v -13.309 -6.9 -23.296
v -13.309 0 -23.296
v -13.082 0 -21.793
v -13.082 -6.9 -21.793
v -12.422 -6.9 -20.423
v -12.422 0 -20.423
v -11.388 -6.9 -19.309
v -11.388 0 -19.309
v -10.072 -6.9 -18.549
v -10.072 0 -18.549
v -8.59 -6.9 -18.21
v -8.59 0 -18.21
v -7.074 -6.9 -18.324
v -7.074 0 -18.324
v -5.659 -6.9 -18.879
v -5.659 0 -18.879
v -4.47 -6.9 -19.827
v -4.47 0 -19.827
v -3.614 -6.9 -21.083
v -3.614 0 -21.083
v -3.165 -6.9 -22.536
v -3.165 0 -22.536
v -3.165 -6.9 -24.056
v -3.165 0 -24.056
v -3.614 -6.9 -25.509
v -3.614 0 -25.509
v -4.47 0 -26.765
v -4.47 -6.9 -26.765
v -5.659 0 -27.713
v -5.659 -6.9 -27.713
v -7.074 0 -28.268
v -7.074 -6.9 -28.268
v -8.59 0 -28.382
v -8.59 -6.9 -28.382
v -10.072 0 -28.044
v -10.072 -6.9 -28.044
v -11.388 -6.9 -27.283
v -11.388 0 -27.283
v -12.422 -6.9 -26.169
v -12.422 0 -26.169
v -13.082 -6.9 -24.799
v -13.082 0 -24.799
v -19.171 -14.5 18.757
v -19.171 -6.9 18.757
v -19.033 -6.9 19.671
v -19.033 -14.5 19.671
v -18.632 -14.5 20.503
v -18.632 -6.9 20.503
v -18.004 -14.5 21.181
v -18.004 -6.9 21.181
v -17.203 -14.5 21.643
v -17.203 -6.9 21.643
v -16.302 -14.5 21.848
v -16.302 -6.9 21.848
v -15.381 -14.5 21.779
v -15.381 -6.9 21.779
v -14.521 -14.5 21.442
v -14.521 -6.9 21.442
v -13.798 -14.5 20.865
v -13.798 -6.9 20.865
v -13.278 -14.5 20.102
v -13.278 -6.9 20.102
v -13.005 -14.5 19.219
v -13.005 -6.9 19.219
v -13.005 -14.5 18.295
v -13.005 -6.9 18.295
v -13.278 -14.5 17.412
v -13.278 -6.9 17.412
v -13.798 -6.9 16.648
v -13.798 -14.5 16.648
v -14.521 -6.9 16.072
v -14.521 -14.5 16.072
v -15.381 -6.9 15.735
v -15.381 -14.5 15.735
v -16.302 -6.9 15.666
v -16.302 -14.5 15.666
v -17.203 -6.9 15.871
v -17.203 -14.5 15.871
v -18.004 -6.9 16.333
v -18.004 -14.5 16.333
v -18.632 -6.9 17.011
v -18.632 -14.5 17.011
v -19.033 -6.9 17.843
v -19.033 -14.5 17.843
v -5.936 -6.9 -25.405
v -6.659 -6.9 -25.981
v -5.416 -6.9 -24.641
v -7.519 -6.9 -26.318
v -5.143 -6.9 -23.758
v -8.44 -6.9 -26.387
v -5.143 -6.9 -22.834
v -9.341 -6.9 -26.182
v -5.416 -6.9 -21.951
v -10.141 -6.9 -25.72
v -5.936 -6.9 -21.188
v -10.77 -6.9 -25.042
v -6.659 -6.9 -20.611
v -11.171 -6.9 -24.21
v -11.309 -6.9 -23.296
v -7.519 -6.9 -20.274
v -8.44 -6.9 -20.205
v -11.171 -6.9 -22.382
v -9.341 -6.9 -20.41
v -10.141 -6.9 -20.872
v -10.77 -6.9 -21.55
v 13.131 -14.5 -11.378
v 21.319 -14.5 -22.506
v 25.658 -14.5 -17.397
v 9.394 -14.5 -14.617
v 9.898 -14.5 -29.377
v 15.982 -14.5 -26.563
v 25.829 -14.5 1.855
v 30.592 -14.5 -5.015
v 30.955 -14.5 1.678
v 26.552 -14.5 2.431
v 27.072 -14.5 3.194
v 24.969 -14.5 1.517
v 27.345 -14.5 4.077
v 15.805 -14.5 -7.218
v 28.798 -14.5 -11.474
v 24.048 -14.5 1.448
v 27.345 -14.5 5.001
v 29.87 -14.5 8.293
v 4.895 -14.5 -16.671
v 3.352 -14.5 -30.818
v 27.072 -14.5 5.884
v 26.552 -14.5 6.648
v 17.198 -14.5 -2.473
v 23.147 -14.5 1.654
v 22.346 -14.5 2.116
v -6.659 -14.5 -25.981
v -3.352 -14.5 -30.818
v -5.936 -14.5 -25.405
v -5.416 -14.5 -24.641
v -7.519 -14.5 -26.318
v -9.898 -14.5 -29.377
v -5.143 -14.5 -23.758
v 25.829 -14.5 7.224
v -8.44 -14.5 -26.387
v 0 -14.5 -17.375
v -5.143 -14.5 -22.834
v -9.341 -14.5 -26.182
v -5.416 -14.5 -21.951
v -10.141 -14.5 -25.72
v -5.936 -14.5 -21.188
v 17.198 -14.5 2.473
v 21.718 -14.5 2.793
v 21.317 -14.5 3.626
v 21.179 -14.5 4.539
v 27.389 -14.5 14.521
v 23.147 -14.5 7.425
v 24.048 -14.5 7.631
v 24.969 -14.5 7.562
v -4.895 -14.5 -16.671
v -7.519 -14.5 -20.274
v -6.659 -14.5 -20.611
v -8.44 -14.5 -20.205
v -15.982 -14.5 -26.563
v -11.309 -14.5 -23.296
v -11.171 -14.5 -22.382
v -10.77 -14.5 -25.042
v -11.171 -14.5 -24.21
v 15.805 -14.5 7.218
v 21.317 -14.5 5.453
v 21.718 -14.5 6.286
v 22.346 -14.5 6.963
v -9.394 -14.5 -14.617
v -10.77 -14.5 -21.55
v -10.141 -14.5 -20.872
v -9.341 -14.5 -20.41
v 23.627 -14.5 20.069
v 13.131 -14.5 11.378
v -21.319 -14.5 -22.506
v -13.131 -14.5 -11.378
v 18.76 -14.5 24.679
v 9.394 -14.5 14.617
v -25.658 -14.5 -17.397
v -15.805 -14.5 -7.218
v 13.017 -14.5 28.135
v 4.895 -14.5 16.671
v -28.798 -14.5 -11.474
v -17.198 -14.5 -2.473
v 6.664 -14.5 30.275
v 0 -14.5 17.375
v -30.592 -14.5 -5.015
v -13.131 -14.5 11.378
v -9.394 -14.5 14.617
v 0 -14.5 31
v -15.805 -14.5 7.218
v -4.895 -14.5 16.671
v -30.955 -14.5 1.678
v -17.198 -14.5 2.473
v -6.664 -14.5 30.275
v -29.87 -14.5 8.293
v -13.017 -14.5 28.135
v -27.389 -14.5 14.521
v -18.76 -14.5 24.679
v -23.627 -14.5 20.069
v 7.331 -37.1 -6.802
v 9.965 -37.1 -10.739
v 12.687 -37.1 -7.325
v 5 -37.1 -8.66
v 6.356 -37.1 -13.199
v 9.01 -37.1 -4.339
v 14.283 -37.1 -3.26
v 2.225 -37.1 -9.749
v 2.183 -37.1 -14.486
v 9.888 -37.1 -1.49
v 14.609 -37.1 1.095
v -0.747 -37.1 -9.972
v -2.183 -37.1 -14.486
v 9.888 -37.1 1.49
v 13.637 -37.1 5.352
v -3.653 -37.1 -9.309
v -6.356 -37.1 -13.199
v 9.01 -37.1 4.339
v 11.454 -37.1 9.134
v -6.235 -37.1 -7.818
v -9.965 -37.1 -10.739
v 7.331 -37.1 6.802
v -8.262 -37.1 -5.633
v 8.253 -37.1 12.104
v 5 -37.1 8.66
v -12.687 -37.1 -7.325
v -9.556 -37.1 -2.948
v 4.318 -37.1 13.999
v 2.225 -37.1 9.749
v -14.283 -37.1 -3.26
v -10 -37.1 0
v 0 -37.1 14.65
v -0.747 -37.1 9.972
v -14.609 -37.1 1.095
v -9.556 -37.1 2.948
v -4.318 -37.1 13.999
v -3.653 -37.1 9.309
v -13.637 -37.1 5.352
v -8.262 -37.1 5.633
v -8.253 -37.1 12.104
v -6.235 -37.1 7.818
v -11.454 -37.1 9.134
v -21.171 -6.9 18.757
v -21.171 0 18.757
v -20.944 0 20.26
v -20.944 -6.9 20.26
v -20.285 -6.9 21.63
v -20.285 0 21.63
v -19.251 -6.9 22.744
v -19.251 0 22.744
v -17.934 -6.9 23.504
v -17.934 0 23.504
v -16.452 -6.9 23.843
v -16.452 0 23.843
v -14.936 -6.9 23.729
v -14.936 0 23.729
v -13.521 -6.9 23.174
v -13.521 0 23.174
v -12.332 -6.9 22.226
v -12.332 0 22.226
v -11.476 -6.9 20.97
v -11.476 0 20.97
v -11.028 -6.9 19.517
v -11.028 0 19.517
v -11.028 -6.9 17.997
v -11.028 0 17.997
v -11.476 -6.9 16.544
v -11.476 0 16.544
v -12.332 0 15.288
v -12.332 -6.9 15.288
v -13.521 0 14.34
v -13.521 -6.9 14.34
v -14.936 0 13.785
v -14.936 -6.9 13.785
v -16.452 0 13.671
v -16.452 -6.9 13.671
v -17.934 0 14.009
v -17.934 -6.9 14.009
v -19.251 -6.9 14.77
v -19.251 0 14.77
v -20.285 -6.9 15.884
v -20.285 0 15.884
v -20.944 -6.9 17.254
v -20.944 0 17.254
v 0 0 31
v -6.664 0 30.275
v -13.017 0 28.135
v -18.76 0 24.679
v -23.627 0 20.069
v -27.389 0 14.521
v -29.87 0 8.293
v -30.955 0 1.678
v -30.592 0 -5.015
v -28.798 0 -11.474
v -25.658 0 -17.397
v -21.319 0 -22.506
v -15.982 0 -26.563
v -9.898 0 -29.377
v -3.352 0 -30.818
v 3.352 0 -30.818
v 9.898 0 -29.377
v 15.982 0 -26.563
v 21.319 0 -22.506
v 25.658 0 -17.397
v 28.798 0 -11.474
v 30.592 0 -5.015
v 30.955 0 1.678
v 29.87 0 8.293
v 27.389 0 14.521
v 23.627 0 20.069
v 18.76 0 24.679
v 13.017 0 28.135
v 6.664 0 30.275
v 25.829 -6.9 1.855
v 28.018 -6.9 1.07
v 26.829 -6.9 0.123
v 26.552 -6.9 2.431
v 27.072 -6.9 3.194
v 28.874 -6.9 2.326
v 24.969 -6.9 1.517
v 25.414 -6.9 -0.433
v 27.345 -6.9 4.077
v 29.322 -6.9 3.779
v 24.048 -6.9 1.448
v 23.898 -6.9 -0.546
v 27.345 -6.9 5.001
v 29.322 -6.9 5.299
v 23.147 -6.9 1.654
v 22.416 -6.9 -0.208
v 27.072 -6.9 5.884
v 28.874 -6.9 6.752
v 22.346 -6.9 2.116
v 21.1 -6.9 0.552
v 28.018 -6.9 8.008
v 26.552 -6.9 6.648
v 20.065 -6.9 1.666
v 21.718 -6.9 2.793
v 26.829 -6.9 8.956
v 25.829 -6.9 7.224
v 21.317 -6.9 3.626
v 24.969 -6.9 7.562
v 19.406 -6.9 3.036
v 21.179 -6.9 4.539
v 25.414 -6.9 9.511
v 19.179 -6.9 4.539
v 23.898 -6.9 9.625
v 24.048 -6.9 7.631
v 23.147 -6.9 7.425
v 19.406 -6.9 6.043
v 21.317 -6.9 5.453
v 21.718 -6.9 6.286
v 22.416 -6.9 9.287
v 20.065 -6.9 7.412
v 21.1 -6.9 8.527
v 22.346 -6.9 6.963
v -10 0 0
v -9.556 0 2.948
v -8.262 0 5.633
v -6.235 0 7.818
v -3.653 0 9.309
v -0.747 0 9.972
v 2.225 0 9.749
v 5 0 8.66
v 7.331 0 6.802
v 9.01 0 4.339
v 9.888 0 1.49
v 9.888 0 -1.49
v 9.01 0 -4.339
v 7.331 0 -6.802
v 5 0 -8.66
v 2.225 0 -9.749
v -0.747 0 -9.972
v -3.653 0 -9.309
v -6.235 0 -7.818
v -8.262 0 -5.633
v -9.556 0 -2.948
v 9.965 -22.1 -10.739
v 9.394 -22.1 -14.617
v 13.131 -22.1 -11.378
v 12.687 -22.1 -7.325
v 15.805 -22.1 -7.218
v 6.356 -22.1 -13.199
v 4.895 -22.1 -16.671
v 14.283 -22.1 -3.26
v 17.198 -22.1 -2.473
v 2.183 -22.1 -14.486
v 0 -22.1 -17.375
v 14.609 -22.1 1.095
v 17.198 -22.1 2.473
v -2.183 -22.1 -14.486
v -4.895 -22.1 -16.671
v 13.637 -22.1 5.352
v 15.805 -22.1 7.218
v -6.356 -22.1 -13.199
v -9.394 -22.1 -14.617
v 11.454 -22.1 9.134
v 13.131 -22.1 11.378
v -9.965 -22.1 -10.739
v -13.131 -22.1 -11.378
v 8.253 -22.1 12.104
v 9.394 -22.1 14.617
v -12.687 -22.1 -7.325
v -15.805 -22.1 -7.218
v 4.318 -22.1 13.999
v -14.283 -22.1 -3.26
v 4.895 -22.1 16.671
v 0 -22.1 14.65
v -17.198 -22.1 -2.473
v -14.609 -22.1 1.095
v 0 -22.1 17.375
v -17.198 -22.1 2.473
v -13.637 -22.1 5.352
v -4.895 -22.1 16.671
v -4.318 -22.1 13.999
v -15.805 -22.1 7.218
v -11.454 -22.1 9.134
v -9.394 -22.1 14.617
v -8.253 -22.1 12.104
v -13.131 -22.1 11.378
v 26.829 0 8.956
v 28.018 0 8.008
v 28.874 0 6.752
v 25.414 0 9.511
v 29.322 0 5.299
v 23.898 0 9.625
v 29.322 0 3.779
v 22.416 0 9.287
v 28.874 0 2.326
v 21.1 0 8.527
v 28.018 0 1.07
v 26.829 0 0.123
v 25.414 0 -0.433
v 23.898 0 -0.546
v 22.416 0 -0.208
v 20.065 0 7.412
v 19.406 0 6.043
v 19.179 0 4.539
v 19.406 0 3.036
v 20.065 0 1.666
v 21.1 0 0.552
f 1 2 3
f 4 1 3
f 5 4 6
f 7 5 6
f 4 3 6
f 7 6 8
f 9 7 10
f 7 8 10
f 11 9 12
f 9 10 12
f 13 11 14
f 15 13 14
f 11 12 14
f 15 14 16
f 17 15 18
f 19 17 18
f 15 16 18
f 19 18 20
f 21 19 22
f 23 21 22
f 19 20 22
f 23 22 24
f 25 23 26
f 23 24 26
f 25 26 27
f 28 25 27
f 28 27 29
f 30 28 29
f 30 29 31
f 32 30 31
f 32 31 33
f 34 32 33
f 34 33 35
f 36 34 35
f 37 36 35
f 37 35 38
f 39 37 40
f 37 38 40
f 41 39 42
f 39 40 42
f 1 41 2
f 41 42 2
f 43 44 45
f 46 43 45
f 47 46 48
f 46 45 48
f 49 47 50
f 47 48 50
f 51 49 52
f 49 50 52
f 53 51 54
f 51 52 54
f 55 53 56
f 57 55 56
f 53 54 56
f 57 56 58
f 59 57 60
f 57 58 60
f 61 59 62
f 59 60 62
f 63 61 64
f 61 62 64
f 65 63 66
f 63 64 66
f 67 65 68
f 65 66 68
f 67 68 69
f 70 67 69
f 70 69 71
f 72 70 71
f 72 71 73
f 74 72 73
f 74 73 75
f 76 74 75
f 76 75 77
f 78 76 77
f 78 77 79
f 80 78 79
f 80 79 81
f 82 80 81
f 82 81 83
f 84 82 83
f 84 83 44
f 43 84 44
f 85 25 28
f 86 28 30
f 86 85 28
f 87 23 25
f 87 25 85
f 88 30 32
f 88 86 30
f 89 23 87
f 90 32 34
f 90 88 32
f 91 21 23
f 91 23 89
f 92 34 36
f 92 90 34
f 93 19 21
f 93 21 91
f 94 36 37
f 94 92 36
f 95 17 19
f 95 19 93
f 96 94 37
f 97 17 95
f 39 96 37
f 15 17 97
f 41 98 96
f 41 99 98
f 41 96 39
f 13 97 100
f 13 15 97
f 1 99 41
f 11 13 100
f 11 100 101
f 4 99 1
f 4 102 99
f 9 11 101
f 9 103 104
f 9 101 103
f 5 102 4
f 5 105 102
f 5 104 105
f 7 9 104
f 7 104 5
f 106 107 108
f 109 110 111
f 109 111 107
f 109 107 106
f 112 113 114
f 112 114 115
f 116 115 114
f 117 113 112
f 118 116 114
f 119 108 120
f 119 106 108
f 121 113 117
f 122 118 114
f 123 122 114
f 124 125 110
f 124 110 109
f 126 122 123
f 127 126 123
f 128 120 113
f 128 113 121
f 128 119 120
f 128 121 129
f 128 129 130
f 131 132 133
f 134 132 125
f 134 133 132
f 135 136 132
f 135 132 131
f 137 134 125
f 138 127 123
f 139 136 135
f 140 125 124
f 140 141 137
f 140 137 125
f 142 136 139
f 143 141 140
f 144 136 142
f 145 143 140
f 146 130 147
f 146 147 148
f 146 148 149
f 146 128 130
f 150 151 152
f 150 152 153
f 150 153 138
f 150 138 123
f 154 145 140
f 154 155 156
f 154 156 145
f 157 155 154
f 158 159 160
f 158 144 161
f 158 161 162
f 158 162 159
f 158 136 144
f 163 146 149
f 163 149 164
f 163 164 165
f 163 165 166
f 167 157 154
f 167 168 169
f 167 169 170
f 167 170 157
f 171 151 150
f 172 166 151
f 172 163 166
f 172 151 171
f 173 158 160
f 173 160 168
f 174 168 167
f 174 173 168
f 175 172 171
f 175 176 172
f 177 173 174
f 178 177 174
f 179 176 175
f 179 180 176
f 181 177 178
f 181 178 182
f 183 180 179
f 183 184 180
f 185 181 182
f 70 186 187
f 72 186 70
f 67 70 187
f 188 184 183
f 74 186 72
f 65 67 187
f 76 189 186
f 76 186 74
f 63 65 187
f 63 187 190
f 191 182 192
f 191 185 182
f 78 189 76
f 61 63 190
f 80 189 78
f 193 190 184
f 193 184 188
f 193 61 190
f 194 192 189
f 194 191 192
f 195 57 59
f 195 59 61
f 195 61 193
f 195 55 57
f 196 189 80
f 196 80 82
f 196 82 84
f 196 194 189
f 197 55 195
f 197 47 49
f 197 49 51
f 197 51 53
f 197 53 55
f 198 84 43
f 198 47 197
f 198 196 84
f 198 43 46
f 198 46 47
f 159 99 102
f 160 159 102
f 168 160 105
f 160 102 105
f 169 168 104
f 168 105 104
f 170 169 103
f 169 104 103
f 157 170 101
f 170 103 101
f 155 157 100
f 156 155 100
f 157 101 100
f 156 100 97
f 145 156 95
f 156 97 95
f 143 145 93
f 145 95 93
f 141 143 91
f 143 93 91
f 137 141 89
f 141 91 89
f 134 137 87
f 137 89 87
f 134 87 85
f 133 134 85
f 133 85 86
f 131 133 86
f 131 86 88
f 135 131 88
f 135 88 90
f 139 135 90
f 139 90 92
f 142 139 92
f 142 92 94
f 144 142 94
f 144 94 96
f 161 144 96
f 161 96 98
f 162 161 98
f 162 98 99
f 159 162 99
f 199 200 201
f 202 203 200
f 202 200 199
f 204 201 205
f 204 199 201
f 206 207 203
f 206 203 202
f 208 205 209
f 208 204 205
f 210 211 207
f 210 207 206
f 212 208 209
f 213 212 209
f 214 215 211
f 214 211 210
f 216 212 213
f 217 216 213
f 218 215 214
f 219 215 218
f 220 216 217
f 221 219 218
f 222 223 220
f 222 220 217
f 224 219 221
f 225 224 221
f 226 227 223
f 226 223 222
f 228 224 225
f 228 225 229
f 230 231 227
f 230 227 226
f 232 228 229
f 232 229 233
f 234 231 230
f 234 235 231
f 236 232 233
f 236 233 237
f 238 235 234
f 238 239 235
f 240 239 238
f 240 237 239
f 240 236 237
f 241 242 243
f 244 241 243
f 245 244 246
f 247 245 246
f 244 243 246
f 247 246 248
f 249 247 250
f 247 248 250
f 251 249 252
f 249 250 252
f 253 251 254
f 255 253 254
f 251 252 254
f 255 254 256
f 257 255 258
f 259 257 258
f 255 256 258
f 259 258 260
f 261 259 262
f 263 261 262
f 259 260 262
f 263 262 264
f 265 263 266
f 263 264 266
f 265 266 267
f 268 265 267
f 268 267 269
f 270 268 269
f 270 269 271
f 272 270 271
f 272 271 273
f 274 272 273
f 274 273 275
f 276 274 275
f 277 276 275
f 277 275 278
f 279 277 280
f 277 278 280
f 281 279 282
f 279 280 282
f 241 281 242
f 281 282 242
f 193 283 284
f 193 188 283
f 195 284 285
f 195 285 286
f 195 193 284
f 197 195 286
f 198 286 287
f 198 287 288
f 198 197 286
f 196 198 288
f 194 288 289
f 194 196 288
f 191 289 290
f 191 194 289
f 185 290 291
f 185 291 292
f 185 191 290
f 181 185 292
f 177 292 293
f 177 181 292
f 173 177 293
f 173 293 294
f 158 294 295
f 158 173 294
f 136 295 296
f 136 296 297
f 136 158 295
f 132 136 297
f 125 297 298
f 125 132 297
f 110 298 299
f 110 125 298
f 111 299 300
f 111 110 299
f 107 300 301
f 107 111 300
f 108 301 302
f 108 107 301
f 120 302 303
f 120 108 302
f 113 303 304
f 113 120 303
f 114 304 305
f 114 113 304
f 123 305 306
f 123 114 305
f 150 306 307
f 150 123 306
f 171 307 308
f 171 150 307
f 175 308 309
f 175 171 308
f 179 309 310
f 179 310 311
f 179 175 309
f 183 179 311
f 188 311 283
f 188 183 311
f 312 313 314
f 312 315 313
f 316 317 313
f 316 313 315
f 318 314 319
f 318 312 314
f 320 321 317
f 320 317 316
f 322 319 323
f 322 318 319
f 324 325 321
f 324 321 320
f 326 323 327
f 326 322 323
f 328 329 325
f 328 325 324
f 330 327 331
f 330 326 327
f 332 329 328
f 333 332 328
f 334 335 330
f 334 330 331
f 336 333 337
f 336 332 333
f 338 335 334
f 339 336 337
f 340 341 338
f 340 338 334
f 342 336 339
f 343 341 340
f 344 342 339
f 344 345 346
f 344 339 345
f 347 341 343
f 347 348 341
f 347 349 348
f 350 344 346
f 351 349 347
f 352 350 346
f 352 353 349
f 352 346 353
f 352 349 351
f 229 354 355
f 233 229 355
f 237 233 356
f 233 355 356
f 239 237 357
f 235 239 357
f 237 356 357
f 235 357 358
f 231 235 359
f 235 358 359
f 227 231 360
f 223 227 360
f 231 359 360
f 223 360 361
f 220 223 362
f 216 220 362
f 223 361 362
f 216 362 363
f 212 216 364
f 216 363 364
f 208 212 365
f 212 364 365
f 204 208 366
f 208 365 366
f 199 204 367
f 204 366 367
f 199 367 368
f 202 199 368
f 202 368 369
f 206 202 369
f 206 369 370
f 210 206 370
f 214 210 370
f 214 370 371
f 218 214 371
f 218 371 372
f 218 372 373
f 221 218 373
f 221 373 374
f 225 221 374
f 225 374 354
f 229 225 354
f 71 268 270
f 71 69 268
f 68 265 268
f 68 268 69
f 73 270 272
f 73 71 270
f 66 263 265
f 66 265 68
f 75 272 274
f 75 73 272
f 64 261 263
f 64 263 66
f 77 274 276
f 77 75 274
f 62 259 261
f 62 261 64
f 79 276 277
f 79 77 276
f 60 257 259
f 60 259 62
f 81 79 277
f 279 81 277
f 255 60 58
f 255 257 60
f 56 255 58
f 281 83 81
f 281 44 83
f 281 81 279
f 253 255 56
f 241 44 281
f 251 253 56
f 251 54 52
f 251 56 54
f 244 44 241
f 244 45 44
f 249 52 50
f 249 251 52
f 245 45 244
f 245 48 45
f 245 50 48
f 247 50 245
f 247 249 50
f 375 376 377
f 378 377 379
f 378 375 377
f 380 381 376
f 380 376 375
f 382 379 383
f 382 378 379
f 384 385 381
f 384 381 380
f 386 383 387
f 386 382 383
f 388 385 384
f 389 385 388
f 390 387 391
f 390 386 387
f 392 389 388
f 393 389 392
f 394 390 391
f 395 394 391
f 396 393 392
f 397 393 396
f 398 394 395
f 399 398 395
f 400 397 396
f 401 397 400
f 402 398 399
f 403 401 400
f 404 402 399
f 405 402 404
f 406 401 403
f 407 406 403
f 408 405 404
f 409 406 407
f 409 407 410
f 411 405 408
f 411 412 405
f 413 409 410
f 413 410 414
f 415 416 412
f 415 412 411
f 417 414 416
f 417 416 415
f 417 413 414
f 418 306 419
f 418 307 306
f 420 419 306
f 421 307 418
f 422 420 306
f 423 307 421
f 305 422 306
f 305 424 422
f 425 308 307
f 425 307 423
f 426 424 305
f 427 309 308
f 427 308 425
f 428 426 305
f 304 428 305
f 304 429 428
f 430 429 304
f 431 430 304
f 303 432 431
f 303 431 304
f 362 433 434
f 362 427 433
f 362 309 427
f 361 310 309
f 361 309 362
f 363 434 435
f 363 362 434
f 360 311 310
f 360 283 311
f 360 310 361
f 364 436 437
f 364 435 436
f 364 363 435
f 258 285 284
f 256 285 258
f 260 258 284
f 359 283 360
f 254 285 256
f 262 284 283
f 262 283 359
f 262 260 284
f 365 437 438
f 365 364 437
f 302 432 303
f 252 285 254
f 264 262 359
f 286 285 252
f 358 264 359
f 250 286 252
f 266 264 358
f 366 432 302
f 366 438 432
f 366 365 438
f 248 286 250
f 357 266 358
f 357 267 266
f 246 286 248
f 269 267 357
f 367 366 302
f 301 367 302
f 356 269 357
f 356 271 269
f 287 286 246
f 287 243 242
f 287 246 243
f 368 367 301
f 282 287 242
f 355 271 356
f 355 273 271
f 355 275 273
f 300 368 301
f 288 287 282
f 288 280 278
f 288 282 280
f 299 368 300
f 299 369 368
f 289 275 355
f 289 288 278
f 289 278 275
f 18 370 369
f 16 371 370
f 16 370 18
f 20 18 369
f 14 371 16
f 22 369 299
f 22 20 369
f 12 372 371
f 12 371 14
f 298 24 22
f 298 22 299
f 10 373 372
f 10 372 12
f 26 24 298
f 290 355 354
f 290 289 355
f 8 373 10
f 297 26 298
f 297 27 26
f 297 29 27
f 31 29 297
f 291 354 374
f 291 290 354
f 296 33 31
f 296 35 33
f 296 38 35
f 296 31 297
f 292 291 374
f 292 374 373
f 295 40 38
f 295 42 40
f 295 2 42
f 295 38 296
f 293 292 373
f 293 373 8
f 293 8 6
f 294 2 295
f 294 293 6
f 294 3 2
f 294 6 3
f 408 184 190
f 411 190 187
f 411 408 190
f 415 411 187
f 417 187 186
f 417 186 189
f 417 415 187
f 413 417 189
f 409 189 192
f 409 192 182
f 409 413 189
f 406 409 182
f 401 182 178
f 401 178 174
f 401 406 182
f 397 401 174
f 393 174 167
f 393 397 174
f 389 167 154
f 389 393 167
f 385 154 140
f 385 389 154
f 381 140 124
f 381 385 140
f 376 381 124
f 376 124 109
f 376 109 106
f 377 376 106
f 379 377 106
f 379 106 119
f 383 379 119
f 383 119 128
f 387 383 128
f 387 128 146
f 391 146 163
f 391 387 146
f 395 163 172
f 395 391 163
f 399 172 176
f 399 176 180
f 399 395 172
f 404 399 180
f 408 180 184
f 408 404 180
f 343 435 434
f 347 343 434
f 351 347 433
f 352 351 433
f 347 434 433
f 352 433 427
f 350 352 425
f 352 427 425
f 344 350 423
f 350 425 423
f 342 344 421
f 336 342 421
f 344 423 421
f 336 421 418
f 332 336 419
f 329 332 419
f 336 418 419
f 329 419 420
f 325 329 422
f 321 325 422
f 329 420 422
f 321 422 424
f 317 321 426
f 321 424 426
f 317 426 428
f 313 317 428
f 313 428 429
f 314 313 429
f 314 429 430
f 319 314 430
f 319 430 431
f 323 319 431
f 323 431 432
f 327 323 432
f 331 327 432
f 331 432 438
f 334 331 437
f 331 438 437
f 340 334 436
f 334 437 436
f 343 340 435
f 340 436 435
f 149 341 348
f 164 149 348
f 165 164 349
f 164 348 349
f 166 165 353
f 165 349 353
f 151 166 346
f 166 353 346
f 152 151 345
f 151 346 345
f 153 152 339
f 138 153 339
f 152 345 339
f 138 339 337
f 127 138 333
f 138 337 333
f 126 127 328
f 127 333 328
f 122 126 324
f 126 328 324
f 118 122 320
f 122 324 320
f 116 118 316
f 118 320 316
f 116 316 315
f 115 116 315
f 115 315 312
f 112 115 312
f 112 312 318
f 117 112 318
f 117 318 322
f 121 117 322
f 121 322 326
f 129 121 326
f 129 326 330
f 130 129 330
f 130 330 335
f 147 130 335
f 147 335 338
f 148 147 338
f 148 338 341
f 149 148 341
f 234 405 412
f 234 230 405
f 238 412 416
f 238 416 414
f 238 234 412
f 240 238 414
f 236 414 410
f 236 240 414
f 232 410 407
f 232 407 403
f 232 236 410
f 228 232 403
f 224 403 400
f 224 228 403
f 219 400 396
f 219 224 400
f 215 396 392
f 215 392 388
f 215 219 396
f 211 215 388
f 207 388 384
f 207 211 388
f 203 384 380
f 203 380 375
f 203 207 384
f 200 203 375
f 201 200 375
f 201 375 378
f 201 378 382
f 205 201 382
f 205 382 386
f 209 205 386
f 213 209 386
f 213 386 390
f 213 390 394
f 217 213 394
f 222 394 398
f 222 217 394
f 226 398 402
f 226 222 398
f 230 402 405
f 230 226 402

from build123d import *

# Parameters (mm, degrees)
F2_R     = 3.1
F2_R_2   = 10
F3_DEPTH = 47.8
F2_R_3   = 5.1
F4_DEPTH = 6.9


with BuildPart() as f1:
    # F0 (on Right) → F1 (revolve)
    with BuildSketch(Plane.YZ):
        Polygon((-22.1, 14.65), (-37.1, 14.65), (-37.1, 0), (0, 0), (0, 31), (-14.5, 31), (-14.5, 17.375), (-22.1, 17.375), align=None)
    revolve(axis=Axis((0, -18.55, 0), (0, -1, 0)))

    # F2 (on face) → F3 (cut)
    with BuildSketch(Plane(origin=(0, 0, 0), x_dir=(-1, 0, 0), z_dir=(0, 1, 0))):
        with Locations((-24.279309, 4.539293)):
            Circle(F2_R)
        Circle(F2_R_2)
        with Locations((16.070797, 18.756852)):
            Circle(F2_R)
        with Locations((8.208512, -23.296144)):
            Circle(F2_R)
    extrude(amount=-F3_DEPTH, mode=Mode.SUBTRACT)

    # F2 (on face) → F4 (cut)
    with BuildSketch(Plane(origin=(0, 0, 0), x_dir=(-1, 0, 0), z_dir=(0, 1, 0))):
        with Locations((-24.279309, 4.539293)):
            Circle(F2_R_3)
        with Locations((-24.279309, 4.539293)):
            Circle(F2_R, mode=Mode.SUBTRACT)
        with Locations((16.070797, 18.756852)):
            Circle(F2_R_3)
        with Locations((16.070797, 18.756852)):
            Circle(F2_R, mode=Mode.SUBTRACT)
        with Locations((8.208512, -23.296144)):
            Circle(F2_R_3)
        with Locations((8.208512, -23.296144)):
            Circle(F2_R, mode=Mode.SUBTRACT)
    extrude(amount=-F4_DEPTH, mode=Mode.SUBTRACT)


solid = f1.part
